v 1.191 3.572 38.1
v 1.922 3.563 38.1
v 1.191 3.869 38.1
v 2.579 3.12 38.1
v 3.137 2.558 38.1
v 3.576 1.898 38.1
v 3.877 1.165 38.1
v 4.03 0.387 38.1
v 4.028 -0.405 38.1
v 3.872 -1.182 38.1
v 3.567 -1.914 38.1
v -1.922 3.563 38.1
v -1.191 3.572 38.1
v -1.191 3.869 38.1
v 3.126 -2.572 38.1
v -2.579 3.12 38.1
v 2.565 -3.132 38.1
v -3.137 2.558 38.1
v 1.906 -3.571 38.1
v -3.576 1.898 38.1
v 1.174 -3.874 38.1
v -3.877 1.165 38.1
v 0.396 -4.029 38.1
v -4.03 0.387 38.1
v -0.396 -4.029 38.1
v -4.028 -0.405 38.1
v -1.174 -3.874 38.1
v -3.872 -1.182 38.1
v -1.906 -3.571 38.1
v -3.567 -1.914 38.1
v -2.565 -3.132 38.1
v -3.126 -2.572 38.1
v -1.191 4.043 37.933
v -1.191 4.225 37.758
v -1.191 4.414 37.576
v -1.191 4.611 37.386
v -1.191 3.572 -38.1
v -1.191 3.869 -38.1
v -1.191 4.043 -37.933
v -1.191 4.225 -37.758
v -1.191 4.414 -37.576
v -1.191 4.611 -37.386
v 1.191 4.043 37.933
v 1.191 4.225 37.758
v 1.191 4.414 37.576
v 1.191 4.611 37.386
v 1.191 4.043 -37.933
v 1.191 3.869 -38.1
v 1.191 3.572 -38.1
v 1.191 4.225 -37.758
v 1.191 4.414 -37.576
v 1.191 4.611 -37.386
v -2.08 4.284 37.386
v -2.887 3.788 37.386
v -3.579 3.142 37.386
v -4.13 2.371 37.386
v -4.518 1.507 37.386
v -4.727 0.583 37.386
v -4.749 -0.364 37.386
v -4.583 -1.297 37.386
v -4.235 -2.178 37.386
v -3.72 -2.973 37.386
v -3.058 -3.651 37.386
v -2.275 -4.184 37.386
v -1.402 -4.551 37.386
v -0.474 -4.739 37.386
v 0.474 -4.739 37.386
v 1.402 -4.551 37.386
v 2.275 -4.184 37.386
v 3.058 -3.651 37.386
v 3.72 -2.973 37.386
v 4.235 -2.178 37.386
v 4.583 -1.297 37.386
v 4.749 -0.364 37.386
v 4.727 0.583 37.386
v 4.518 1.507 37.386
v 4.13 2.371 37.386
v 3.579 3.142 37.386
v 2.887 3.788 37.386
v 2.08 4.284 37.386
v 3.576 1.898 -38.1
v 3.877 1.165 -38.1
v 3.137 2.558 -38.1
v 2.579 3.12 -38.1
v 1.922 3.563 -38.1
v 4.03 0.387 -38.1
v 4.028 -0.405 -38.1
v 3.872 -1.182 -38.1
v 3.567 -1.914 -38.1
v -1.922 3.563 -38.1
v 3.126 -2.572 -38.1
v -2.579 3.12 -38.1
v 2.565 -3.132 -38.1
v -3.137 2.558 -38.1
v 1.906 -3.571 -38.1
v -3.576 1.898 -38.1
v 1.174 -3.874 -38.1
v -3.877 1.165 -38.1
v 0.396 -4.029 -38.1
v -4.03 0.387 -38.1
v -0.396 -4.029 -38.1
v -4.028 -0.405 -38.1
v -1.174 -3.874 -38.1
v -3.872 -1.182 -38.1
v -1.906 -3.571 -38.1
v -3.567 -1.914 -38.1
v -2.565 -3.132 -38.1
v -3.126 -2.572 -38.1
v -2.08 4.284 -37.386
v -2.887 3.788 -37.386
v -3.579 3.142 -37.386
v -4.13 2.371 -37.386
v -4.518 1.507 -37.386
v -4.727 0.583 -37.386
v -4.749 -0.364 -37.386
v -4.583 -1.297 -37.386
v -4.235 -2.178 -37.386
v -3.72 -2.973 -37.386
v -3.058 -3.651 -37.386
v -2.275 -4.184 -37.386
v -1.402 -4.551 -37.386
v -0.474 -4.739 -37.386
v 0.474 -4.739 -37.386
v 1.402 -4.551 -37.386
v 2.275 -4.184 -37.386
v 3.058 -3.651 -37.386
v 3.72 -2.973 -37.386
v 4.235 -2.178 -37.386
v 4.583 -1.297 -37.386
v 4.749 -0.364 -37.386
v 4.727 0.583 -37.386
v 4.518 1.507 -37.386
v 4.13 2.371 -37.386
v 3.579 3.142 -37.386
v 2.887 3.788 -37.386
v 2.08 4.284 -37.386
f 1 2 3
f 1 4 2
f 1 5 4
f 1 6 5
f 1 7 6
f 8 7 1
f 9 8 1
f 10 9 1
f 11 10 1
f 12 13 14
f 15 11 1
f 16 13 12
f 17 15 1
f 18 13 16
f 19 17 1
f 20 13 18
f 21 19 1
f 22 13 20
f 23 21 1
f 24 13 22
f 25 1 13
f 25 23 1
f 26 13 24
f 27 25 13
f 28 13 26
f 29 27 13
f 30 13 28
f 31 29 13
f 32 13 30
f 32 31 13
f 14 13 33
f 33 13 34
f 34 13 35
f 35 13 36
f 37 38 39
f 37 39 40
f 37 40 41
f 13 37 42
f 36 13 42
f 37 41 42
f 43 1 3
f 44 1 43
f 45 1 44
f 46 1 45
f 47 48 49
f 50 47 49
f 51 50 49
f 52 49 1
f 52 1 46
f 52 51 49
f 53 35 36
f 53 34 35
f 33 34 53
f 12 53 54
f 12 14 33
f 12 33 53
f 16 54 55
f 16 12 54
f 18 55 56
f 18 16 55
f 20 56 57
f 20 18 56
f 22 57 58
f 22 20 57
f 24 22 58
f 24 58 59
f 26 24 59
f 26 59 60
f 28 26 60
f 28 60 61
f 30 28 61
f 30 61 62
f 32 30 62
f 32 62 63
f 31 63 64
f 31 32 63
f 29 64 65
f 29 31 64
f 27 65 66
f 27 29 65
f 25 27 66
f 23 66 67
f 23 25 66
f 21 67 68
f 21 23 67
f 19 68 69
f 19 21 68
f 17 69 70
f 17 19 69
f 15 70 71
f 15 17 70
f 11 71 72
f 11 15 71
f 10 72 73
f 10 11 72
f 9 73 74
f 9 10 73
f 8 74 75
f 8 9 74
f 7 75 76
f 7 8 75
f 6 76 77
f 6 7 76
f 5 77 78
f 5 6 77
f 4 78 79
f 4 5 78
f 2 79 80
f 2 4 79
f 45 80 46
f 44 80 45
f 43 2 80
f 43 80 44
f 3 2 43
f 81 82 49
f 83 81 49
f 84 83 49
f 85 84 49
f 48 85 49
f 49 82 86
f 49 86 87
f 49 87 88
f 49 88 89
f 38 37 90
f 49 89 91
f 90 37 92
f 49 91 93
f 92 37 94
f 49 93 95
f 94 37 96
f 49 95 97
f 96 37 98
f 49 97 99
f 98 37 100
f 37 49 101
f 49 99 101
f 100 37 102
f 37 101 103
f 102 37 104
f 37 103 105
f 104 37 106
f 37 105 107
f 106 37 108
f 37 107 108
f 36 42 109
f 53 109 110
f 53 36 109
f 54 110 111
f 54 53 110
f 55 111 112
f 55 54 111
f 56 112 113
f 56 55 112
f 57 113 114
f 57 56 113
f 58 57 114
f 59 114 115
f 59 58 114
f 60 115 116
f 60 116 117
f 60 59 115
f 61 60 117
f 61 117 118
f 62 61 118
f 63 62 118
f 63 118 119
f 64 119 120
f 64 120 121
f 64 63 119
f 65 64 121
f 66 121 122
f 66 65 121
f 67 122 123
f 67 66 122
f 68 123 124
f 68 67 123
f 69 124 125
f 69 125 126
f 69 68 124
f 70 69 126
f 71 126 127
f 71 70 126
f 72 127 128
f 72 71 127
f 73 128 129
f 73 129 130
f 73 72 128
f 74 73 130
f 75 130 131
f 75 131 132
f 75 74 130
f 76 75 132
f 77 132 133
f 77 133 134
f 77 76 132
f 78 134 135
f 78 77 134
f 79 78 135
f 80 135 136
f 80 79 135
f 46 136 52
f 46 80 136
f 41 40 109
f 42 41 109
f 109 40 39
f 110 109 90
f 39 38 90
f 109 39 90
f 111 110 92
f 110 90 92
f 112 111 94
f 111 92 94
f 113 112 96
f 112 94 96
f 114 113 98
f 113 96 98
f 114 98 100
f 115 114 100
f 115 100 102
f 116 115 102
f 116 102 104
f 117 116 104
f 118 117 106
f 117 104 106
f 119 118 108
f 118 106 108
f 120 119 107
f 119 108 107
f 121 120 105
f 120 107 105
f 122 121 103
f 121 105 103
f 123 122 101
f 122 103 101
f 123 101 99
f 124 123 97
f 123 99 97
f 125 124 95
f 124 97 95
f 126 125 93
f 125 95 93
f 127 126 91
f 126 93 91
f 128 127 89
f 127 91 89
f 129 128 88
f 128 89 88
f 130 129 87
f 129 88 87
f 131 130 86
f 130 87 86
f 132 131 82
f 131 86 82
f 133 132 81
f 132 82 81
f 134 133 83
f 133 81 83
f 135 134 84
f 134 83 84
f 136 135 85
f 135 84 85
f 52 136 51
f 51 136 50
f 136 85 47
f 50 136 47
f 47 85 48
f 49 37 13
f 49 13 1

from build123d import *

# Parameters (mm, degrees)
SKETCH1_R           = 4.7625
EXTRUDE1_DEPTH      = 38.1
CHAMFER1_SIZE       = 0.714375
EXTRUDE2_DEPTH      = 39.690732902
EXTRUDE2_DEPTH_BACK = 39.690732902
SKETCH3_W           = 2.38125
SKETCH3_H           = 1.190625


with BuildPart() as part:
    # Sketch1 → Extrude1 (new, symmetric)
    with BuildSketch(Plane.XY):
        with Locations(Location((0, 0, 0), (0, 0, 180))):
            Circle(SKETCH1_R)
    extrude(amount=EXTRUDE1_DEPTH, both=True)

    # Chamfer1
    chamfer1_edges = [part.edges().sort_by_distance(p)[0] for p in [
        (4.7625, 0, -38.1),
        (4.7625, 0, 38.1),
    ]]
    chamfer(chamfer1_edges, length=CHAMFER1_SIZE)

    # Sketch3 → Extrude2 (cut, two sides: drawn at the far end of the back side and taken through both)
    with BuildSketch(Plane.XY.offset(-EXTRUDE2_DEPTH_BACK)):
        with Locations((0, 4.1671875)):
            Rectangle(SKETCH3_W, SKETCH3_H)
    extrude(amount=EXTRUDE2_DEPTH + EXTRUDE2_DEPTH_BACK, mode=Mode.SUBTRACT)


solid = part.part
